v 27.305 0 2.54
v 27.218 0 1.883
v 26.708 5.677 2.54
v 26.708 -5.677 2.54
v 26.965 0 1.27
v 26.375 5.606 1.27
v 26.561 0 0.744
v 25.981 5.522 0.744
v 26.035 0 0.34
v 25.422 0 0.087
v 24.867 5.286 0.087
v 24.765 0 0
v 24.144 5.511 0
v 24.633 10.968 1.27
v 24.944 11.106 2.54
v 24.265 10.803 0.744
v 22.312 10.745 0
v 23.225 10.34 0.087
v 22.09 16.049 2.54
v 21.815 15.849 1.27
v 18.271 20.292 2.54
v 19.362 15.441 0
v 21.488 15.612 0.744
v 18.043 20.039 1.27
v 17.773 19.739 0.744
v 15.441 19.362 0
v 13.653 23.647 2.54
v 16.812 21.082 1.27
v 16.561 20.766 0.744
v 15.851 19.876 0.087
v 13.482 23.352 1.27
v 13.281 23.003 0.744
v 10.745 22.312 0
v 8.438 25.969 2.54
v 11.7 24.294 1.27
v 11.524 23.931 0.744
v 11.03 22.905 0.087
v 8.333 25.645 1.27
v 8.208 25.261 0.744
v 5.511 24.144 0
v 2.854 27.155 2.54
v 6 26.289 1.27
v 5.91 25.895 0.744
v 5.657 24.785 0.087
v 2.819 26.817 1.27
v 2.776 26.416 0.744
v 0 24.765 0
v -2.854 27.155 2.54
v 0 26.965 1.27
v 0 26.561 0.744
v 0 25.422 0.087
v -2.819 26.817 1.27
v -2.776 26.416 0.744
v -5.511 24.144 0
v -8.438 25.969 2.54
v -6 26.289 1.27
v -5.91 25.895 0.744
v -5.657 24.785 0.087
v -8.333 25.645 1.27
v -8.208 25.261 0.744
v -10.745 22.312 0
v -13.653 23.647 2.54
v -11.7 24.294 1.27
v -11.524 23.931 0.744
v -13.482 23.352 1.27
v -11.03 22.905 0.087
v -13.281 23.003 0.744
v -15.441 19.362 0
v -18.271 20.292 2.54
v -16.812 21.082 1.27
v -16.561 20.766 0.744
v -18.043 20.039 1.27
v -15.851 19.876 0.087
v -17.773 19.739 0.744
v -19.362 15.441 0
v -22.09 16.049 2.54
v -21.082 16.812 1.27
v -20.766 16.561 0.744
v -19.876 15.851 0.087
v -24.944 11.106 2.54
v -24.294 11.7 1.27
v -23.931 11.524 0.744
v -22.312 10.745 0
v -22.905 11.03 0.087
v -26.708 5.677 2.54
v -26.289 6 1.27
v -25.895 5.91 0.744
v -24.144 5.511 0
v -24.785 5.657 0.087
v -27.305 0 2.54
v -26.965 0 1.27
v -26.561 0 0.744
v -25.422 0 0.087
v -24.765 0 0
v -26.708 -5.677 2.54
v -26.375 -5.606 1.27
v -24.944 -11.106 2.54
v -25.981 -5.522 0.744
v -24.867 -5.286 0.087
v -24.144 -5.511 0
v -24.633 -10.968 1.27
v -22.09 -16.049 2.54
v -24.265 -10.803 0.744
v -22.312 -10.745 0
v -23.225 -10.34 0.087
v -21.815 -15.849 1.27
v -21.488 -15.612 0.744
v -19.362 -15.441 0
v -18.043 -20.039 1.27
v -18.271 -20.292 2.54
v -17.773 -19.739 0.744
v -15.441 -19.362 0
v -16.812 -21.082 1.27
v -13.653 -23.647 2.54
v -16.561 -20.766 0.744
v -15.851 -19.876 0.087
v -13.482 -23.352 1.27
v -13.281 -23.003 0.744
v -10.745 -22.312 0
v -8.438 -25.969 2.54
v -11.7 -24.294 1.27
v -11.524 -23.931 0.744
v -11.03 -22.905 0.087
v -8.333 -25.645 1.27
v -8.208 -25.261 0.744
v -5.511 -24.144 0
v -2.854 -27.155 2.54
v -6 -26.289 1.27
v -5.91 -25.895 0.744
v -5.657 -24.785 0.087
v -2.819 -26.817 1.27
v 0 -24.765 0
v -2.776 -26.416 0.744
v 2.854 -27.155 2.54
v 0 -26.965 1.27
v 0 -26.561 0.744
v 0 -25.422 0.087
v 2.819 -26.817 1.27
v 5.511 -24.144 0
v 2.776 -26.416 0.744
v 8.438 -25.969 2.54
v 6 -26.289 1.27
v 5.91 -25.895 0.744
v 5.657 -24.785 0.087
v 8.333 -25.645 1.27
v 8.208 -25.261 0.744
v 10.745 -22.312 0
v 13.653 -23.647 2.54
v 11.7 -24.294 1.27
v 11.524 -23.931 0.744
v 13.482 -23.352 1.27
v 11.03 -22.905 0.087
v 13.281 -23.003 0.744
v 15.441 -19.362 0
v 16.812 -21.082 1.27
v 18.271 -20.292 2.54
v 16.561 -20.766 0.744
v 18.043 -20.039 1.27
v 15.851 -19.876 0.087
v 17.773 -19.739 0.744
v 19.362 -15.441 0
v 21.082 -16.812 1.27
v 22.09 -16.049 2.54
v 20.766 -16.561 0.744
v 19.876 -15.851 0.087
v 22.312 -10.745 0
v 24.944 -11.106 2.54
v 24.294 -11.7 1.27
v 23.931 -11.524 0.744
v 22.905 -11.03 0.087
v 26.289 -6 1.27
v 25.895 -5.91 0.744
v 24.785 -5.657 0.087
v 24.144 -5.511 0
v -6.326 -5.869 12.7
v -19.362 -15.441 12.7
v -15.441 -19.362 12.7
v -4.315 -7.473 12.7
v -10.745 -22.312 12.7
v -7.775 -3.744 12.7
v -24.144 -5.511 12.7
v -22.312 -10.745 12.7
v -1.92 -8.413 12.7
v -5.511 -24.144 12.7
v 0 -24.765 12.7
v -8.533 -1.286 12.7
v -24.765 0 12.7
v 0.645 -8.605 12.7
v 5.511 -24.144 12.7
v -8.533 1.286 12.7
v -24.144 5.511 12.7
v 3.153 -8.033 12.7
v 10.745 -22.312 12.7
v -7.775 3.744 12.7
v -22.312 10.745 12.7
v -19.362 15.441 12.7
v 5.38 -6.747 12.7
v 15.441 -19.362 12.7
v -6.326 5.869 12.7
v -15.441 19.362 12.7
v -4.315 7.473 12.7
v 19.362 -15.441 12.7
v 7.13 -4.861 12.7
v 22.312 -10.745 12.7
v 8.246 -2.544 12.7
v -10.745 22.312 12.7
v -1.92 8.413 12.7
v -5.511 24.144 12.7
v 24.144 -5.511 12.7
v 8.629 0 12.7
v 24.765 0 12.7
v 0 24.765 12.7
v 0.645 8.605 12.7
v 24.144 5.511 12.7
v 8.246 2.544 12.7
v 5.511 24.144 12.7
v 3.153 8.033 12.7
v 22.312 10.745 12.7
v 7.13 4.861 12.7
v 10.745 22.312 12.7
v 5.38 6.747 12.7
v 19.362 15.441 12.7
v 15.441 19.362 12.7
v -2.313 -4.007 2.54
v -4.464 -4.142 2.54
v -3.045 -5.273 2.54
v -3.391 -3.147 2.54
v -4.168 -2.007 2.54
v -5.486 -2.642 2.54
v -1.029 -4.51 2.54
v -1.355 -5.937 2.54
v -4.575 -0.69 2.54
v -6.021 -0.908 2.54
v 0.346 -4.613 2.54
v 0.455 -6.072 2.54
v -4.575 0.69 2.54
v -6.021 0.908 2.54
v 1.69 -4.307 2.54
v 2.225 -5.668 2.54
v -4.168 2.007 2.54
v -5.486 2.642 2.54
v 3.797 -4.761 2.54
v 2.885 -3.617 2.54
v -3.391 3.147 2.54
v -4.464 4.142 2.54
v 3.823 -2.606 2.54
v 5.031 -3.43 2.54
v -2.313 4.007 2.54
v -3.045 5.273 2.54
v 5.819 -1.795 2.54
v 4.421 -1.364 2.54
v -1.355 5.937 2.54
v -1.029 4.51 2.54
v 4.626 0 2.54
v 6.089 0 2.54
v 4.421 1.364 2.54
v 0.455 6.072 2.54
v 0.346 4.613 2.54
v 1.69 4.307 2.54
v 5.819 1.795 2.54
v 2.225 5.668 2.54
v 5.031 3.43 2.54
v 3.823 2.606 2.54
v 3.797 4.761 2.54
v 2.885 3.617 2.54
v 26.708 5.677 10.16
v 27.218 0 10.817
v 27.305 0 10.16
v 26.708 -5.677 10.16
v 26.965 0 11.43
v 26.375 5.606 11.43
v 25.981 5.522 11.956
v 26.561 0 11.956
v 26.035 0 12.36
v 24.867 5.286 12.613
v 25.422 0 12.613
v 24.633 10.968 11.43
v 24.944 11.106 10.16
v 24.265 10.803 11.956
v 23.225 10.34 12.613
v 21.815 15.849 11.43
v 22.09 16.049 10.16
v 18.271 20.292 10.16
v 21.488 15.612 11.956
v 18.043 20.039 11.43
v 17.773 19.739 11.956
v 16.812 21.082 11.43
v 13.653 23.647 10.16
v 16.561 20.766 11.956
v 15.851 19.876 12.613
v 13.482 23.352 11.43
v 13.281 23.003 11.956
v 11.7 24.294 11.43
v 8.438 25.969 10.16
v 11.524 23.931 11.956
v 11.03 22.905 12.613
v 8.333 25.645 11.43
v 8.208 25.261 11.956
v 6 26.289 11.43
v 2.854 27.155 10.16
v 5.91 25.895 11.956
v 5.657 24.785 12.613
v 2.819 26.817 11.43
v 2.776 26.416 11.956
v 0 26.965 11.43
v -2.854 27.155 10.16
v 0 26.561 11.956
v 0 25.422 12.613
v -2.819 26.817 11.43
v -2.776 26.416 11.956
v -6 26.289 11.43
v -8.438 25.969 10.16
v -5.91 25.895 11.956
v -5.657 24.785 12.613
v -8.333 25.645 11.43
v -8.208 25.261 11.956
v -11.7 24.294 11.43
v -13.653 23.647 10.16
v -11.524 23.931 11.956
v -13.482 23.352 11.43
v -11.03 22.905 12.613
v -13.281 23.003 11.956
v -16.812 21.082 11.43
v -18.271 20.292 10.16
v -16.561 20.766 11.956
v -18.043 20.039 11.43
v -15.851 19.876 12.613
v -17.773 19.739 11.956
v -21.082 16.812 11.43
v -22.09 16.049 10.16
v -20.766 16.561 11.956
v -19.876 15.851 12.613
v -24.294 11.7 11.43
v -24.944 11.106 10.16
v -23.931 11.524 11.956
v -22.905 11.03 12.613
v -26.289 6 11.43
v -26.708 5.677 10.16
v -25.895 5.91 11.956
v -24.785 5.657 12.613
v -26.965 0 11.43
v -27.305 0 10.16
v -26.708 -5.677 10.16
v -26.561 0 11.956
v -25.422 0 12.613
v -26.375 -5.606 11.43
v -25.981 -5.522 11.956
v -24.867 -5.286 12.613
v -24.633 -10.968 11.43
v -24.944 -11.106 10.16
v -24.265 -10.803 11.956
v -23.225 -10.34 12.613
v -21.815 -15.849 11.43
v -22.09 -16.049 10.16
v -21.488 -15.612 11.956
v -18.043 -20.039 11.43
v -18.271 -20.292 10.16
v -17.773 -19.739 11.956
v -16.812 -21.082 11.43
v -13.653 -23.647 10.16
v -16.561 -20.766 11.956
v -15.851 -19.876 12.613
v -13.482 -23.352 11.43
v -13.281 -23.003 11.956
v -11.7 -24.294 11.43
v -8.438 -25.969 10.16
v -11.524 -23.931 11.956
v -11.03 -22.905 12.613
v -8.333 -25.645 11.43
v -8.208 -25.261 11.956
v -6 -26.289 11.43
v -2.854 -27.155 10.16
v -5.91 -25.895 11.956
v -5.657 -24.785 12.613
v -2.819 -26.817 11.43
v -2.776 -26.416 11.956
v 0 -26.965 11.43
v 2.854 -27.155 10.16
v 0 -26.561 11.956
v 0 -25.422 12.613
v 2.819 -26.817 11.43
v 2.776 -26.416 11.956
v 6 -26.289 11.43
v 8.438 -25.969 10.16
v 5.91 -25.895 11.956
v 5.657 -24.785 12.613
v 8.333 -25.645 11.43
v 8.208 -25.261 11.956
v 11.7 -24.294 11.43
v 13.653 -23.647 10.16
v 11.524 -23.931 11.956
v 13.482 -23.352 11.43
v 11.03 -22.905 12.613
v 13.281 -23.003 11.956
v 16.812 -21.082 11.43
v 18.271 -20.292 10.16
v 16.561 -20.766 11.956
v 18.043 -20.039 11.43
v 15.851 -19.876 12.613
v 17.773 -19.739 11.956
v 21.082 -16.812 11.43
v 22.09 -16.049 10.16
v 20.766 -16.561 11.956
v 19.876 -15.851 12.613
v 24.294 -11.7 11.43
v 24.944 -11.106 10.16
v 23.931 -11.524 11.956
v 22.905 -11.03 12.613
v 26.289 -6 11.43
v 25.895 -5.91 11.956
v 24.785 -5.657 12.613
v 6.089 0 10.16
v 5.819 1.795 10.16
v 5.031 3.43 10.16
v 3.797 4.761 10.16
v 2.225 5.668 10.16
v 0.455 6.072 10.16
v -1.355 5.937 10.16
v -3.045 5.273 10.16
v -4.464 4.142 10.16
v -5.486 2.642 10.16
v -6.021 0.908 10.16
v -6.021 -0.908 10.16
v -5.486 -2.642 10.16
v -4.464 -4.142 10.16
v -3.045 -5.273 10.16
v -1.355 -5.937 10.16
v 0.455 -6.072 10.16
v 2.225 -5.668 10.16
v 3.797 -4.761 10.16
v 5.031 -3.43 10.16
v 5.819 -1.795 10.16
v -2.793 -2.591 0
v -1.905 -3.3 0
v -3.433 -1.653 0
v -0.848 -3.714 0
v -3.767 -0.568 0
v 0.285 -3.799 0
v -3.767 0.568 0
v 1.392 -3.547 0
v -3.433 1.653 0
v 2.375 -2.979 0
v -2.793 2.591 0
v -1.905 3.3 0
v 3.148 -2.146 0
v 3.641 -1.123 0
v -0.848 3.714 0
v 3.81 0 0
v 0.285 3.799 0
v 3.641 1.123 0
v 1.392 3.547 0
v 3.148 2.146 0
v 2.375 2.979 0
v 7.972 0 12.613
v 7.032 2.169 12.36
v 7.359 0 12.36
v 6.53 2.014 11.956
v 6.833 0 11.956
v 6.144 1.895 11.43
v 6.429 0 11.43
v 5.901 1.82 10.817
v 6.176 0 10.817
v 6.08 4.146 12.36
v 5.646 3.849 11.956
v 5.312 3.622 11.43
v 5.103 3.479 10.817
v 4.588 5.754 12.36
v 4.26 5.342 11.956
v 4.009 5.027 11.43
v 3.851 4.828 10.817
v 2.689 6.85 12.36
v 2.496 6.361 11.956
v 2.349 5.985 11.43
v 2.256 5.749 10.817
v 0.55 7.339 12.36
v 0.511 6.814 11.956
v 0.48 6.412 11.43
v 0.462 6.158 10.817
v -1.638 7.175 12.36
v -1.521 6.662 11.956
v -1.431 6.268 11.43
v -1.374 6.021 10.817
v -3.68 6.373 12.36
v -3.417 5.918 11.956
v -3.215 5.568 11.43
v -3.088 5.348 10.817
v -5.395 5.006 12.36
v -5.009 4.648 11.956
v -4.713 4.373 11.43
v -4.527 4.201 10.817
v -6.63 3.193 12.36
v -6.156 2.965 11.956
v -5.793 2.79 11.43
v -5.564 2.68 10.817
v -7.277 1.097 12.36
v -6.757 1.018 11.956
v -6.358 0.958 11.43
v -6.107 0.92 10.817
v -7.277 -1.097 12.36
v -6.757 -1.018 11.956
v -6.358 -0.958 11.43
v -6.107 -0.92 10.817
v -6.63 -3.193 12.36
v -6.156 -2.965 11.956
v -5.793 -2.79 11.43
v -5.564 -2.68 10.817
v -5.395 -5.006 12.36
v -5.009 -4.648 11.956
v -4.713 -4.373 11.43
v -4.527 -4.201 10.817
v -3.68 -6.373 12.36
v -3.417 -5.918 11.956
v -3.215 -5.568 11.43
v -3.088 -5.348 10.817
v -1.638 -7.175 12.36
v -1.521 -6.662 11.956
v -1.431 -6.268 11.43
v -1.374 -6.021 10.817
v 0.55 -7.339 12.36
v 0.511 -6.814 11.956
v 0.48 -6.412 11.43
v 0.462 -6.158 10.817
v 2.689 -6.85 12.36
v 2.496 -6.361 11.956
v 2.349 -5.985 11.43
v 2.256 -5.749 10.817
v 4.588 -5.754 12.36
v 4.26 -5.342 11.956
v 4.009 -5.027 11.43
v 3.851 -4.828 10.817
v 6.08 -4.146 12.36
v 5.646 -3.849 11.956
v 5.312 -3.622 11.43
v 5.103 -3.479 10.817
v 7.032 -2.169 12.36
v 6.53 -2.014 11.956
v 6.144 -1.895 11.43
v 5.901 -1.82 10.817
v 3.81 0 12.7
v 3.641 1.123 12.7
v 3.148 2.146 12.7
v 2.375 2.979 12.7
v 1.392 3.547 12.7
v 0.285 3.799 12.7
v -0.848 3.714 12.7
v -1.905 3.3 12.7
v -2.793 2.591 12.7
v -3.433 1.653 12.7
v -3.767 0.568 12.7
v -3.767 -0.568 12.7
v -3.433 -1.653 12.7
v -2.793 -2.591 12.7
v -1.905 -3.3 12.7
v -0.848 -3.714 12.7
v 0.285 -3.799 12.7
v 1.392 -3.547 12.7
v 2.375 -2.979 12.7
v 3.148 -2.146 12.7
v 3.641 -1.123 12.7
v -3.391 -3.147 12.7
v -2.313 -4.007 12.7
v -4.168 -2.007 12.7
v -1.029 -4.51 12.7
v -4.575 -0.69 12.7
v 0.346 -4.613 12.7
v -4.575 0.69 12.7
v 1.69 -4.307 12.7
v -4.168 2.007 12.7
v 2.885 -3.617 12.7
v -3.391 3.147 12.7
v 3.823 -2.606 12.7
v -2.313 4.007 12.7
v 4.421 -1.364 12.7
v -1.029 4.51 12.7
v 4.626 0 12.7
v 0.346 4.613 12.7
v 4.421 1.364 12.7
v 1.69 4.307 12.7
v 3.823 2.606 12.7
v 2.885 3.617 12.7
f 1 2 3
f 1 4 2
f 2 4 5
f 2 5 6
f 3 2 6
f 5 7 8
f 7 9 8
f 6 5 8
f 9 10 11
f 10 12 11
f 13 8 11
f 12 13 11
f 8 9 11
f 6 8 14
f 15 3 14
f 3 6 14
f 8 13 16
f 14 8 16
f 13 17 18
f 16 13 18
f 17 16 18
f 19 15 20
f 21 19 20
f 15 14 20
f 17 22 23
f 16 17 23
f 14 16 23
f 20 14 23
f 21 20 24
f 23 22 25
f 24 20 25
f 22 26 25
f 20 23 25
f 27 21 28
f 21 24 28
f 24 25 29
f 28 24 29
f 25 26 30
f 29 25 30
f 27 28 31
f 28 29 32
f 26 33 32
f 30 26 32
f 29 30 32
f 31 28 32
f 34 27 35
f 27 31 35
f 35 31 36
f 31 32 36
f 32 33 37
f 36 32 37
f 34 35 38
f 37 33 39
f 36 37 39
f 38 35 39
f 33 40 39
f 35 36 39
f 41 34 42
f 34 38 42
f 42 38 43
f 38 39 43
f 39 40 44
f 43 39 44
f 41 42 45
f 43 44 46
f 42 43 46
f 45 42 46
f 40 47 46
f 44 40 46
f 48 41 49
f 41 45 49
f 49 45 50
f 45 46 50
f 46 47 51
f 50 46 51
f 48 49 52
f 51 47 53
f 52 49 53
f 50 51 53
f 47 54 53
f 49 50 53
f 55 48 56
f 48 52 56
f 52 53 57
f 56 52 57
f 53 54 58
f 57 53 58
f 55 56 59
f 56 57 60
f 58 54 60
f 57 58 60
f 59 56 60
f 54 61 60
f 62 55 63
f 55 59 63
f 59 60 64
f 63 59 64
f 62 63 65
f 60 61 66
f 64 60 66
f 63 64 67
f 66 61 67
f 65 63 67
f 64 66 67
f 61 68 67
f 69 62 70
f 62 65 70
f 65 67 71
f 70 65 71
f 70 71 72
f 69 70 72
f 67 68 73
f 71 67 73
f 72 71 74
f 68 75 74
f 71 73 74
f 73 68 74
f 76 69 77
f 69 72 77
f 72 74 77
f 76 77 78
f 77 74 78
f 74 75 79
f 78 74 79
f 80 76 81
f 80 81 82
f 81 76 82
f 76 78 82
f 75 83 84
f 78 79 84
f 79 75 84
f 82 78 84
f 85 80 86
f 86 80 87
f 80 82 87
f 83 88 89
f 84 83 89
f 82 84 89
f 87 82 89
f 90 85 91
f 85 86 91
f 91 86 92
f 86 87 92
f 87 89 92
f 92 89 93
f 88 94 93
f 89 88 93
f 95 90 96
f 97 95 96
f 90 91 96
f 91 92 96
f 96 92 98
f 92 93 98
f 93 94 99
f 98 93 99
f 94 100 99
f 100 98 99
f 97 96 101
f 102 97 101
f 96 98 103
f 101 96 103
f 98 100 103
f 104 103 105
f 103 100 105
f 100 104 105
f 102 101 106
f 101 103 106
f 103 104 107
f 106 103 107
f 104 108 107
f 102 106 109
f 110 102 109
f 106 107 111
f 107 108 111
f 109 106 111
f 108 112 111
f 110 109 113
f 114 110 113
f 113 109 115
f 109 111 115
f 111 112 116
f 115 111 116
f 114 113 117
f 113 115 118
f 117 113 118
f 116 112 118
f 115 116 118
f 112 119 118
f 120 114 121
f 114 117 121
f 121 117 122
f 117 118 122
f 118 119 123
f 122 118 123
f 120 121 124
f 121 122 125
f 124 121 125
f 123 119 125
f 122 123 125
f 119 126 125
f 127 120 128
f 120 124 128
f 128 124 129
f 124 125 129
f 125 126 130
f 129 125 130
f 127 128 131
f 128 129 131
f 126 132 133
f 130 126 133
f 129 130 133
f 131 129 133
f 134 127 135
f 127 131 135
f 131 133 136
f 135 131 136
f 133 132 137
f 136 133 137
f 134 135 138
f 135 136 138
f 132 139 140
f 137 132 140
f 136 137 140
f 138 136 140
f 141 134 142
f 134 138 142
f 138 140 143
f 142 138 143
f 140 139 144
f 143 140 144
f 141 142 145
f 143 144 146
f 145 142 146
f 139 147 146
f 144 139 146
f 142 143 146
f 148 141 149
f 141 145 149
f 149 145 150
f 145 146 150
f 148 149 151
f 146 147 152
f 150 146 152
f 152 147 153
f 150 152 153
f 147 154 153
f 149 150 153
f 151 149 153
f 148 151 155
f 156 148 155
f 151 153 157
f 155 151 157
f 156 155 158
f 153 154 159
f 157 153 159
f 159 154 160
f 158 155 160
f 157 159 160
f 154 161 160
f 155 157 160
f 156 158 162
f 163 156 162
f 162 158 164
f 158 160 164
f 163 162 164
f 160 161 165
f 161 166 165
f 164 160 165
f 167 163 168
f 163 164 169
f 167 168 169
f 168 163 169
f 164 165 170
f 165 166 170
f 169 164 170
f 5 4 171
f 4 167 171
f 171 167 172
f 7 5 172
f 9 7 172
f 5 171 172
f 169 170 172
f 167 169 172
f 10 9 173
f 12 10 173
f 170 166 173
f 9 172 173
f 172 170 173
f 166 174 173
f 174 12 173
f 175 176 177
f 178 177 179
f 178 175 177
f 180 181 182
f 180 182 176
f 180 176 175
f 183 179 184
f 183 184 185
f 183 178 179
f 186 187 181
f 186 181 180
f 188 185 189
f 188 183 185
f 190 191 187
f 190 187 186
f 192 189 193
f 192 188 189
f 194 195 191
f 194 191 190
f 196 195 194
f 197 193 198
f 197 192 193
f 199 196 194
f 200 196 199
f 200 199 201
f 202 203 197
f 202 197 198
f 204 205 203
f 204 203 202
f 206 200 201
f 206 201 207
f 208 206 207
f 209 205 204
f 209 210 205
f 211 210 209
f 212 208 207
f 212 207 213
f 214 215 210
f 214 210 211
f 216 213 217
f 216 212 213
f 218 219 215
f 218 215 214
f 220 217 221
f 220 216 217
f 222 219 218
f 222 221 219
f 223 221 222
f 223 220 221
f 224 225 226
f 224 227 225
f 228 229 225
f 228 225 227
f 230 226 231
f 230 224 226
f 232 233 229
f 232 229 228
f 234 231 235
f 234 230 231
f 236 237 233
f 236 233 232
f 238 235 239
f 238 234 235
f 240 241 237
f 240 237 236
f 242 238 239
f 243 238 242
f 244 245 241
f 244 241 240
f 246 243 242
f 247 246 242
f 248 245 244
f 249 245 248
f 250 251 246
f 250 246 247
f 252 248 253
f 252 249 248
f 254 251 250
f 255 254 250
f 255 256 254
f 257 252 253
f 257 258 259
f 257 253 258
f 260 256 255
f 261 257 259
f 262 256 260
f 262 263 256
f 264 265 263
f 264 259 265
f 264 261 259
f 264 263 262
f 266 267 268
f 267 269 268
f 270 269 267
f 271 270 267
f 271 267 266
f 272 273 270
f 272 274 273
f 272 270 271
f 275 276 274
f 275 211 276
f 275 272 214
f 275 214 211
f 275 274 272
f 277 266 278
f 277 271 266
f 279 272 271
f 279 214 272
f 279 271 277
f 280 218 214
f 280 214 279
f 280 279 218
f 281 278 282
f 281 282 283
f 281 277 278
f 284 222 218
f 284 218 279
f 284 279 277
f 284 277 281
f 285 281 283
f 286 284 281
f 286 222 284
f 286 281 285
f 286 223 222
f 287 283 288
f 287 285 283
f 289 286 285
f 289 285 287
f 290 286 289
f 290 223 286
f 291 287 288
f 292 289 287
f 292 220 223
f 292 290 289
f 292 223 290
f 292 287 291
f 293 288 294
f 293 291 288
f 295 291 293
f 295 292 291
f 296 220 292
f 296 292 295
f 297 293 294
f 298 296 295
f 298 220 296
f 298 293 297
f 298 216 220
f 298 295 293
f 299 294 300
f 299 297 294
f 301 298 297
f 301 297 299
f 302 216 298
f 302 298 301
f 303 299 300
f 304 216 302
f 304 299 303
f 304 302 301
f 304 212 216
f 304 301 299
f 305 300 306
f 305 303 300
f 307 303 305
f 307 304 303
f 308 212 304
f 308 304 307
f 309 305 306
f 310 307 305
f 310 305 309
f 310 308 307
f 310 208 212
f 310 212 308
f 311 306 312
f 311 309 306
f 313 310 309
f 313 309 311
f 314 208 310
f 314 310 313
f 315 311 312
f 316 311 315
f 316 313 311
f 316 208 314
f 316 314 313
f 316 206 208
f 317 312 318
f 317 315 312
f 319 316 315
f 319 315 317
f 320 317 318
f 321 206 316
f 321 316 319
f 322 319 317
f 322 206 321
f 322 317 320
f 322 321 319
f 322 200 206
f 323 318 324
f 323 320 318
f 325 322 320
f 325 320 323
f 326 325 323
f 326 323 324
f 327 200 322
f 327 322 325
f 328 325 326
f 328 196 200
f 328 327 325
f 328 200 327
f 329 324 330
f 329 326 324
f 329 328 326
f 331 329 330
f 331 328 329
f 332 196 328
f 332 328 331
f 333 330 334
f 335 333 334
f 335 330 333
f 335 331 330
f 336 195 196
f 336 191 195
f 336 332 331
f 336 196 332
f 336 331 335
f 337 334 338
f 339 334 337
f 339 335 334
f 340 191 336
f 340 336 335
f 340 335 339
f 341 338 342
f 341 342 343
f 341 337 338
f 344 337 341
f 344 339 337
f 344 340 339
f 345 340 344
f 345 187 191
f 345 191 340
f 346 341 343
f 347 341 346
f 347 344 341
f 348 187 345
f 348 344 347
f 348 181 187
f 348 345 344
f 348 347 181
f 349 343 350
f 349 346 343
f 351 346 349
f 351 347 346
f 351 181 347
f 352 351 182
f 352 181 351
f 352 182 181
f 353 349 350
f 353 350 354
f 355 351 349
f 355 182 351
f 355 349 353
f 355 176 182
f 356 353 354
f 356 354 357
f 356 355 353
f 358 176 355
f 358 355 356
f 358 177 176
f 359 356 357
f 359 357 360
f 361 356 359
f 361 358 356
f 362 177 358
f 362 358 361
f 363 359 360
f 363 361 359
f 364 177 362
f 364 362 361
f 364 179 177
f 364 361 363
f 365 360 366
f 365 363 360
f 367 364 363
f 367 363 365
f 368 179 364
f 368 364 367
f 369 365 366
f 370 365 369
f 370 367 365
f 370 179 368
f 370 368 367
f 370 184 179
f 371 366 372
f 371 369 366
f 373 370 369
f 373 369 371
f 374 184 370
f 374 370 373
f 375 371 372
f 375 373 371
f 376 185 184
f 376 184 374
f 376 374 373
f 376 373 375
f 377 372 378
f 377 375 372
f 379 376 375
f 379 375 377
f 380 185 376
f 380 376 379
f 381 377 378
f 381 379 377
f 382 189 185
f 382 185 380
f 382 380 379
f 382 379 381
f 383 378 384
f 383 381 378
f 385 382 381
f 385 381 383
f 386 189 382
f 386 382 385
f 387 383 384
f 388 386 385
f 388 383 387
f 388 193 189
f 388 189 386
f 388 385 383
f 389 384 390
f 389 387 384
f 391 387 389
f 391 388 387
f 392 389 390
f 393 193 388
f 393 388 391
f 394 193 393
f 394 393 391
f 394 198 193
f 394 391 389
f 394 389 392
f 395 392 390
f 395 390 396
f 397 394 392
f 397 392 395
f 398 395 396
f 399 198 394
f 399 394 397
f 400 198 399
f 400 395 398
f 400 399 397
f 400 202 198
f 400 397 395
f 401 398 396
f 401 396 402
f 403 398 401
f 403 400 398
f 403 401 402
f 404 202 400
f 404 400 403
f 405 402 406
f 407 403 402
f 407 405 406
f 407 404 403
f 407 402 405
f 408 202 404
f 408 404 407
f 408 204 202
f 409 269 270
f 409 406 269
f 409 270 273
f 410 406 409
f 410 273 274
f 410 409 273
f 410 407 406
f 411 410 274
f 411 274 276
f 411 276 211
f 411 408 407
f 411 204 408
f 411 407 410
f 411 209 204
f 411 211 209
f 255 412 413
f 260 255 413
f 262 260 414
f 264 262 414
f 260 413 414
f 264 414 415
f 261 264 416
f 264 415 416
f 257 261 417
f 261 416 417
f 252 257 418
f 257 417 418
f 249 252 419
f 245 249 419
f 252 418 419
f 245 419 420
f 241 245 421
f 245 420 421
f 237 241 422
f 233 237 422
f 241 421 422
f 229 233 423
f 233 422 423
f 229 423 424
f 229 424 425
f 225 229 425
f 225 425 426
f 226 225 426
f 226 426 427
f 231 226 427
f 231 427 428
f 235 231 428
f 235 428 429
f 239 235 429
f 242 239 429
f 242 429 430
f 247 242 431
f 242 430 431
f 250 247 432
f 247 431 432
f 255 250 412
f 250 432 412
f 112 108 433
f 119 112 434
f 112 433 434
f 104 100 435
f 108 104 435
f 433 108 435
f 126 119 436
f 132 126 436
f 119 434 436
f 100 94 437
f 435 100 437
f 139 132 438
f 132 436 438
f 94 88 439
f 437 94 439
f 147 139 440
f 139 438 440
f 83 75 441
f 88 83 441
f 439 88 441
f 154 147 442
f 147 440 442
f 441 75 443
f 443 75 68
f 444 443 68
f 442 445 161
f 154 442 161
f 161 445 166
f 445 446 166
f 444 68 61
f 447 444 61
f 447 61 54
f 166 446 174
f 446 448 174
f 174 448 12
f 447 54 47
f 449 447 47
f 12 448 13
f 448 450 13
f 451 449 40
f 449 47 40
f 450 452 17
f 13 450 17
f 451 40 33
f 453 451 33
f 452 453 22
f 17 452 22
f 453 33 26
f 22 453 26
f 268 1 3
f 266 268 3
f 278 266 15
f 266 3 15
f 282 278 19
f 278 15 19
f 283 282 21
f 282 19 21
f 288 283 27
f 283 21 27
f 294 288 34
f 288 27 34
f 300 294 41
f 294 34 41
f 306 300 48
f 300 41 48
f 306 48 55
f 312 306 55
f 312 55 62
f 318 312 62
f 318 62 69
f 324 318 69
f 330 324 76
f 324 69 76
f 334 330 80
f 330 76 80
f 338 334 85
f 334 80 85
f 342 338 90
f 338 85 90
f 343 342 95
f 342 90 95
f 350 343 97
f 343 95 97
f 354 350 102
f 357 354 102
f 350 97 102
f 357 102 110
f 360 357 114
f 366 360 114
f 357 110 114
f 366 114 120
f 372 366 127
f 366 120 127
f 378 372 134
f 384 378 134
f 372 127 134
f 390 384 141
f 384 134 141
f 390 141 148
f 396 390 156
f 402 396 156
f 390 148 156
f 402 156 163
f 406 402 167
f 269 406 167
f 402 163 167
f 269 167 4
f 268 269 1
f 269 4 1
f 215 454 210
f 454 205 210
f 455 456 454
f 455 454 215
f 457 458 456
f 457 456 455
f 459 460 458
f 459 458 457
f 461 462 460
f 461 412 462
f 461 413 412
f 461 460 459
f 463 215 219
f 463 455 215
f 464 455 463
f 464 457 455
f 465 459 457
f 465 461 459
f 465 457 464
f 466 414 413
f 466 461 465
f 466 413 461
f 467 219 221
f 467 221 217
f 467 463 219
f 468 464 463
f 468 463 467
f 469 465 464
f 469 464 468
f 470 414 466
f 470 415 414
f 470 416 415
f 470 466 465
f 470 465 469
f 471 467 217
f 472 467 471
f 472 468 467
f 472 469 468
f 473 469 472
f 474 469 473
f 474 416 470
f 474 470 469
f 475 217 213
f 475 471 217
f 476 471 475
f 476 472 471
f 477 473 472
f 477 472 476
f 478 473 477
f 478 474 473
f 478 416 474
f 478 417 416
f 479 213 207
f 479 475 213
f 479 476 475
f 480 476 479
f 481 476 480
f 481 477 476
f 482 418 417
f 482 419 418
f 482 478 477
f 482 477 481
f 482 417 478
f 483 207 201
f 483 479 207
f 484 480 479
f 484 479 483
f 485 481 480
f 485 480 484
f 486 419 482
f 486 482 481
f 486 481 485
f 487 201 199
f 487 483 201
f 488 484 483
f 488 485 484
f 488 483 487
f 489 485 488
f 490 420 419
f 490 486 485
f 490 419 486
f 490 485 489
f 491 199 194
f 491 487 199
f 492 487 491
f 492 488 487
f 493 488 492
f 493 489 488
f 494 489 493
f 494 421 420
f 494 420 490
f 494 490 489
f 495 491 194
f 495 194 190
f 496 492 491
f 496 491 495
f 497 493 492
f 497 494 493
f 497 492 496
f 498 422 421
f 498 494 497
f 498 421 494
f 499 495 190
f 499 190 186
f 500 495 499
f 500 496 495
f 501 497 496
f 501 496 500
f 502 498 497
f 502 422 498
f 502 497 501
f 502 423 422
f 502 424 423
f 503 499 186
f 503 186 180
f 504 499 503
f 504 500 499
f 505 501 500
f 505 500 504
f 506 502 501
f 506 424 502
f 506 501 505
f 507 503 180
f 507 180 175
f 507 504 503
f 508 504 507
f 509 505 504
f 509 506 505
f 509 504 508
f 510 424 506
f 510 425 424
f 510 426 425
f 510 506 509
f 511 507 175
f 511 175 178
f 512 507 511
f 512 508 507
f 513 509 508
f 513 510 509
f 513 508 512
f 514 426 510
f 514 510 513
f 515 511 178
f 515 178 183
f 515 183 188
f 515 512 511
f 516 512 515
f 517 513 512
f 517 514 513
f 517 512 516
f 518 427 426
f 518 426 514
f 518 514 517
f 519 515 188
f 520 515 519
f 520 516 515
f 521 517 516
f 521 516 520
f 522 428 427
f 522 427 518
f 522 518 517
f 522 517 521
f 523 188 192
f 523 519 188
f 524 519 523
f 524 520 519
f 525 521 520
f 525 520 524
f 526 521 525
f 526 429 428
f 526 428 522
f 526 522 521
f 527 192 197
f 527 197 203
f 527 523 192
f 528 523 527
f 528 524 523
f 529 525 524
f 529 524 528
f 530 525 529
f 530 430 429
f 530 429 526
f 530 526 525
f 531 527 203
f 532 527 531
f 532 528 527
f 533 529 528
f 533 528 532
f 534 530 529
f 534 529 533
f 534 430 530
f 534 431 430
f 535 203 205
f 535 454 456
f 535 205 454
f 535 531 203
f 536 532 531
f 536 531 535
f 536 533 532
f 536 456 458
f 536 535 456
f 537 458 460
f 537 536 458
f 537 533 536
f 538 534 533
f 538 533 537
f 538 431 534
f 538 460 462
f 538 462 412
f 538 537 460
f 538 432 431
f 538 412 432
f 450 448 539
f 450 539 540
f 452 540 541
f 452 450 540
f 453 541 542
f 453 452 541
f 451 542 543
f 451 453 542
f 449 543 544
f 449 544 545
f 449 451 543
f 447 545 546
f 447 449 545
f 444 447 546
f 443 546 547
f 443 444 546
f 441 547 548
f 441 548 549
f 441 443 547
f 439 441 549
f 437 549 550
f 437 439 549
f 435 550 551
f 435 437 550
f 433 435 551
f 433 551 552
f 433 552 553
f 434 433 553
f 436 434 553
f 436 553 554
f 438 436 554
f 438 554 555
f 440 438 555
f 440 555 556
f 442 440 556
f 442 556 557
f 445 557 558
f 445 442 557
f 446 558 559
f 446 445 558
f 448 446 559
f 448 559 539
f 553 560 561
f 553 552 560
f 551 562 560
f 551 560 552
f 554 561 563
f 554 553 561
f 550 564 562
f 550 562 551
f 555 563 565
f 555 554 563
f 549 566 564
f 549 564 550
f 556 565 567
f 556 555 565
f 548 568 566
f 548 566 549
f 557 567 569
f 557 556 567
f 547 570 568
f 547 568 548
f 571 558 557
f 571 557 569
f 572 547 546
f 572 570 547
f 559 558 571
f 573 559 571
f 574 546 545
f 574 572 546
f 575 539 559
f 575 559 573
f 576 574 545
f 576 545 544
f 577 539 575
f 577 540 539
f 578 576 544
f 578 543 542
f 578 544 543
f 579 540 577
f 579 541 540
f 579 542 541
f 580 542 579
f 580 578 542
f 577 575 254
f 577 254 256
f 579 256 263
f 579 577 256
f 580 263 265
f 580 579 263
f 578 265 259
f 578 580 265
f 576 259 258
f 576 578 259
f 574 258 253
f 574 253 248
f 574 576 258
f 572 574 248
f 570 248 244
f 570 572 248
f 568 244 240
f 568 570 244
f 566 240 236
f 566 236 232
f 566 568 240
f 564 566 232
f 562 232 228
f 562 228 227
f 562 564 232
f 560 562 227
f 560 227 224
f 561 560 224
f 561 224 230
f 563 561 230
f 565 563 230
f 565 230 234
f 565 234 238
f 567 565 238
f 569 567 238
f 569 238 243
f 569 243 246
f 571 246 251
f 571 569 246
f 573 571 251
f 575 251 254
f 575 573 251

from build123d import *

# Parameters (mm, degrees)
SKETCH1_R           = 27.305
SKETCH1_R_2         = 3.81
BOSS_EXTRUDE1_DEPTH = 12.7
SKETCH2_R           = 6.089197758
SKETCH2_R_2         = 4.626410668
CUT_EXTRUDE1_DEPTH  = 10.16
FILLET2_R           = 2.54
FILLET3_R           = 2.54


with BuildPart() as part:
    # Sketch1 → Boss-Extrude1 (new body)
    with BuildSketch(Plane.XY):
        Circle(SKETCH1_R)
        Circle(SKETCH1_R_2, mode=Mode.SUBTRACT)
    extrude(amount=BOSS_EXTRUDE1_DEPTH)

    # Sketch2 → Cut-Extrude1 (cut)
    with BuildSketch(Plane.XY.offset(12.7)):
        Circle(SKETCH2_R)
        Circle(SKETCH2_R_2, mode=Mode.SUBTRACT)
    extrude(amount=-CUT_EXTRUDE1_DEPTH, mode=Mode.SUBTRACT)

    # Fillet2
    fillet2_edges = [part.edges().sort_by_distance(p)[0] for p in [
        (-6.089197758, 0, 12.7),
        (-27.305, 0, 12.7),
    ]]
    fillet(fillet2_edges, radius=FILLET2_R)

    # Fillet3
    fillet3_edges = [part.edges().sort_by_distance(p)[0] for p in [
        (-27.305, 0, 0),
    ]]
    fillet(fillet3_edges, radius=FILLET3_R)


solid = part.part
